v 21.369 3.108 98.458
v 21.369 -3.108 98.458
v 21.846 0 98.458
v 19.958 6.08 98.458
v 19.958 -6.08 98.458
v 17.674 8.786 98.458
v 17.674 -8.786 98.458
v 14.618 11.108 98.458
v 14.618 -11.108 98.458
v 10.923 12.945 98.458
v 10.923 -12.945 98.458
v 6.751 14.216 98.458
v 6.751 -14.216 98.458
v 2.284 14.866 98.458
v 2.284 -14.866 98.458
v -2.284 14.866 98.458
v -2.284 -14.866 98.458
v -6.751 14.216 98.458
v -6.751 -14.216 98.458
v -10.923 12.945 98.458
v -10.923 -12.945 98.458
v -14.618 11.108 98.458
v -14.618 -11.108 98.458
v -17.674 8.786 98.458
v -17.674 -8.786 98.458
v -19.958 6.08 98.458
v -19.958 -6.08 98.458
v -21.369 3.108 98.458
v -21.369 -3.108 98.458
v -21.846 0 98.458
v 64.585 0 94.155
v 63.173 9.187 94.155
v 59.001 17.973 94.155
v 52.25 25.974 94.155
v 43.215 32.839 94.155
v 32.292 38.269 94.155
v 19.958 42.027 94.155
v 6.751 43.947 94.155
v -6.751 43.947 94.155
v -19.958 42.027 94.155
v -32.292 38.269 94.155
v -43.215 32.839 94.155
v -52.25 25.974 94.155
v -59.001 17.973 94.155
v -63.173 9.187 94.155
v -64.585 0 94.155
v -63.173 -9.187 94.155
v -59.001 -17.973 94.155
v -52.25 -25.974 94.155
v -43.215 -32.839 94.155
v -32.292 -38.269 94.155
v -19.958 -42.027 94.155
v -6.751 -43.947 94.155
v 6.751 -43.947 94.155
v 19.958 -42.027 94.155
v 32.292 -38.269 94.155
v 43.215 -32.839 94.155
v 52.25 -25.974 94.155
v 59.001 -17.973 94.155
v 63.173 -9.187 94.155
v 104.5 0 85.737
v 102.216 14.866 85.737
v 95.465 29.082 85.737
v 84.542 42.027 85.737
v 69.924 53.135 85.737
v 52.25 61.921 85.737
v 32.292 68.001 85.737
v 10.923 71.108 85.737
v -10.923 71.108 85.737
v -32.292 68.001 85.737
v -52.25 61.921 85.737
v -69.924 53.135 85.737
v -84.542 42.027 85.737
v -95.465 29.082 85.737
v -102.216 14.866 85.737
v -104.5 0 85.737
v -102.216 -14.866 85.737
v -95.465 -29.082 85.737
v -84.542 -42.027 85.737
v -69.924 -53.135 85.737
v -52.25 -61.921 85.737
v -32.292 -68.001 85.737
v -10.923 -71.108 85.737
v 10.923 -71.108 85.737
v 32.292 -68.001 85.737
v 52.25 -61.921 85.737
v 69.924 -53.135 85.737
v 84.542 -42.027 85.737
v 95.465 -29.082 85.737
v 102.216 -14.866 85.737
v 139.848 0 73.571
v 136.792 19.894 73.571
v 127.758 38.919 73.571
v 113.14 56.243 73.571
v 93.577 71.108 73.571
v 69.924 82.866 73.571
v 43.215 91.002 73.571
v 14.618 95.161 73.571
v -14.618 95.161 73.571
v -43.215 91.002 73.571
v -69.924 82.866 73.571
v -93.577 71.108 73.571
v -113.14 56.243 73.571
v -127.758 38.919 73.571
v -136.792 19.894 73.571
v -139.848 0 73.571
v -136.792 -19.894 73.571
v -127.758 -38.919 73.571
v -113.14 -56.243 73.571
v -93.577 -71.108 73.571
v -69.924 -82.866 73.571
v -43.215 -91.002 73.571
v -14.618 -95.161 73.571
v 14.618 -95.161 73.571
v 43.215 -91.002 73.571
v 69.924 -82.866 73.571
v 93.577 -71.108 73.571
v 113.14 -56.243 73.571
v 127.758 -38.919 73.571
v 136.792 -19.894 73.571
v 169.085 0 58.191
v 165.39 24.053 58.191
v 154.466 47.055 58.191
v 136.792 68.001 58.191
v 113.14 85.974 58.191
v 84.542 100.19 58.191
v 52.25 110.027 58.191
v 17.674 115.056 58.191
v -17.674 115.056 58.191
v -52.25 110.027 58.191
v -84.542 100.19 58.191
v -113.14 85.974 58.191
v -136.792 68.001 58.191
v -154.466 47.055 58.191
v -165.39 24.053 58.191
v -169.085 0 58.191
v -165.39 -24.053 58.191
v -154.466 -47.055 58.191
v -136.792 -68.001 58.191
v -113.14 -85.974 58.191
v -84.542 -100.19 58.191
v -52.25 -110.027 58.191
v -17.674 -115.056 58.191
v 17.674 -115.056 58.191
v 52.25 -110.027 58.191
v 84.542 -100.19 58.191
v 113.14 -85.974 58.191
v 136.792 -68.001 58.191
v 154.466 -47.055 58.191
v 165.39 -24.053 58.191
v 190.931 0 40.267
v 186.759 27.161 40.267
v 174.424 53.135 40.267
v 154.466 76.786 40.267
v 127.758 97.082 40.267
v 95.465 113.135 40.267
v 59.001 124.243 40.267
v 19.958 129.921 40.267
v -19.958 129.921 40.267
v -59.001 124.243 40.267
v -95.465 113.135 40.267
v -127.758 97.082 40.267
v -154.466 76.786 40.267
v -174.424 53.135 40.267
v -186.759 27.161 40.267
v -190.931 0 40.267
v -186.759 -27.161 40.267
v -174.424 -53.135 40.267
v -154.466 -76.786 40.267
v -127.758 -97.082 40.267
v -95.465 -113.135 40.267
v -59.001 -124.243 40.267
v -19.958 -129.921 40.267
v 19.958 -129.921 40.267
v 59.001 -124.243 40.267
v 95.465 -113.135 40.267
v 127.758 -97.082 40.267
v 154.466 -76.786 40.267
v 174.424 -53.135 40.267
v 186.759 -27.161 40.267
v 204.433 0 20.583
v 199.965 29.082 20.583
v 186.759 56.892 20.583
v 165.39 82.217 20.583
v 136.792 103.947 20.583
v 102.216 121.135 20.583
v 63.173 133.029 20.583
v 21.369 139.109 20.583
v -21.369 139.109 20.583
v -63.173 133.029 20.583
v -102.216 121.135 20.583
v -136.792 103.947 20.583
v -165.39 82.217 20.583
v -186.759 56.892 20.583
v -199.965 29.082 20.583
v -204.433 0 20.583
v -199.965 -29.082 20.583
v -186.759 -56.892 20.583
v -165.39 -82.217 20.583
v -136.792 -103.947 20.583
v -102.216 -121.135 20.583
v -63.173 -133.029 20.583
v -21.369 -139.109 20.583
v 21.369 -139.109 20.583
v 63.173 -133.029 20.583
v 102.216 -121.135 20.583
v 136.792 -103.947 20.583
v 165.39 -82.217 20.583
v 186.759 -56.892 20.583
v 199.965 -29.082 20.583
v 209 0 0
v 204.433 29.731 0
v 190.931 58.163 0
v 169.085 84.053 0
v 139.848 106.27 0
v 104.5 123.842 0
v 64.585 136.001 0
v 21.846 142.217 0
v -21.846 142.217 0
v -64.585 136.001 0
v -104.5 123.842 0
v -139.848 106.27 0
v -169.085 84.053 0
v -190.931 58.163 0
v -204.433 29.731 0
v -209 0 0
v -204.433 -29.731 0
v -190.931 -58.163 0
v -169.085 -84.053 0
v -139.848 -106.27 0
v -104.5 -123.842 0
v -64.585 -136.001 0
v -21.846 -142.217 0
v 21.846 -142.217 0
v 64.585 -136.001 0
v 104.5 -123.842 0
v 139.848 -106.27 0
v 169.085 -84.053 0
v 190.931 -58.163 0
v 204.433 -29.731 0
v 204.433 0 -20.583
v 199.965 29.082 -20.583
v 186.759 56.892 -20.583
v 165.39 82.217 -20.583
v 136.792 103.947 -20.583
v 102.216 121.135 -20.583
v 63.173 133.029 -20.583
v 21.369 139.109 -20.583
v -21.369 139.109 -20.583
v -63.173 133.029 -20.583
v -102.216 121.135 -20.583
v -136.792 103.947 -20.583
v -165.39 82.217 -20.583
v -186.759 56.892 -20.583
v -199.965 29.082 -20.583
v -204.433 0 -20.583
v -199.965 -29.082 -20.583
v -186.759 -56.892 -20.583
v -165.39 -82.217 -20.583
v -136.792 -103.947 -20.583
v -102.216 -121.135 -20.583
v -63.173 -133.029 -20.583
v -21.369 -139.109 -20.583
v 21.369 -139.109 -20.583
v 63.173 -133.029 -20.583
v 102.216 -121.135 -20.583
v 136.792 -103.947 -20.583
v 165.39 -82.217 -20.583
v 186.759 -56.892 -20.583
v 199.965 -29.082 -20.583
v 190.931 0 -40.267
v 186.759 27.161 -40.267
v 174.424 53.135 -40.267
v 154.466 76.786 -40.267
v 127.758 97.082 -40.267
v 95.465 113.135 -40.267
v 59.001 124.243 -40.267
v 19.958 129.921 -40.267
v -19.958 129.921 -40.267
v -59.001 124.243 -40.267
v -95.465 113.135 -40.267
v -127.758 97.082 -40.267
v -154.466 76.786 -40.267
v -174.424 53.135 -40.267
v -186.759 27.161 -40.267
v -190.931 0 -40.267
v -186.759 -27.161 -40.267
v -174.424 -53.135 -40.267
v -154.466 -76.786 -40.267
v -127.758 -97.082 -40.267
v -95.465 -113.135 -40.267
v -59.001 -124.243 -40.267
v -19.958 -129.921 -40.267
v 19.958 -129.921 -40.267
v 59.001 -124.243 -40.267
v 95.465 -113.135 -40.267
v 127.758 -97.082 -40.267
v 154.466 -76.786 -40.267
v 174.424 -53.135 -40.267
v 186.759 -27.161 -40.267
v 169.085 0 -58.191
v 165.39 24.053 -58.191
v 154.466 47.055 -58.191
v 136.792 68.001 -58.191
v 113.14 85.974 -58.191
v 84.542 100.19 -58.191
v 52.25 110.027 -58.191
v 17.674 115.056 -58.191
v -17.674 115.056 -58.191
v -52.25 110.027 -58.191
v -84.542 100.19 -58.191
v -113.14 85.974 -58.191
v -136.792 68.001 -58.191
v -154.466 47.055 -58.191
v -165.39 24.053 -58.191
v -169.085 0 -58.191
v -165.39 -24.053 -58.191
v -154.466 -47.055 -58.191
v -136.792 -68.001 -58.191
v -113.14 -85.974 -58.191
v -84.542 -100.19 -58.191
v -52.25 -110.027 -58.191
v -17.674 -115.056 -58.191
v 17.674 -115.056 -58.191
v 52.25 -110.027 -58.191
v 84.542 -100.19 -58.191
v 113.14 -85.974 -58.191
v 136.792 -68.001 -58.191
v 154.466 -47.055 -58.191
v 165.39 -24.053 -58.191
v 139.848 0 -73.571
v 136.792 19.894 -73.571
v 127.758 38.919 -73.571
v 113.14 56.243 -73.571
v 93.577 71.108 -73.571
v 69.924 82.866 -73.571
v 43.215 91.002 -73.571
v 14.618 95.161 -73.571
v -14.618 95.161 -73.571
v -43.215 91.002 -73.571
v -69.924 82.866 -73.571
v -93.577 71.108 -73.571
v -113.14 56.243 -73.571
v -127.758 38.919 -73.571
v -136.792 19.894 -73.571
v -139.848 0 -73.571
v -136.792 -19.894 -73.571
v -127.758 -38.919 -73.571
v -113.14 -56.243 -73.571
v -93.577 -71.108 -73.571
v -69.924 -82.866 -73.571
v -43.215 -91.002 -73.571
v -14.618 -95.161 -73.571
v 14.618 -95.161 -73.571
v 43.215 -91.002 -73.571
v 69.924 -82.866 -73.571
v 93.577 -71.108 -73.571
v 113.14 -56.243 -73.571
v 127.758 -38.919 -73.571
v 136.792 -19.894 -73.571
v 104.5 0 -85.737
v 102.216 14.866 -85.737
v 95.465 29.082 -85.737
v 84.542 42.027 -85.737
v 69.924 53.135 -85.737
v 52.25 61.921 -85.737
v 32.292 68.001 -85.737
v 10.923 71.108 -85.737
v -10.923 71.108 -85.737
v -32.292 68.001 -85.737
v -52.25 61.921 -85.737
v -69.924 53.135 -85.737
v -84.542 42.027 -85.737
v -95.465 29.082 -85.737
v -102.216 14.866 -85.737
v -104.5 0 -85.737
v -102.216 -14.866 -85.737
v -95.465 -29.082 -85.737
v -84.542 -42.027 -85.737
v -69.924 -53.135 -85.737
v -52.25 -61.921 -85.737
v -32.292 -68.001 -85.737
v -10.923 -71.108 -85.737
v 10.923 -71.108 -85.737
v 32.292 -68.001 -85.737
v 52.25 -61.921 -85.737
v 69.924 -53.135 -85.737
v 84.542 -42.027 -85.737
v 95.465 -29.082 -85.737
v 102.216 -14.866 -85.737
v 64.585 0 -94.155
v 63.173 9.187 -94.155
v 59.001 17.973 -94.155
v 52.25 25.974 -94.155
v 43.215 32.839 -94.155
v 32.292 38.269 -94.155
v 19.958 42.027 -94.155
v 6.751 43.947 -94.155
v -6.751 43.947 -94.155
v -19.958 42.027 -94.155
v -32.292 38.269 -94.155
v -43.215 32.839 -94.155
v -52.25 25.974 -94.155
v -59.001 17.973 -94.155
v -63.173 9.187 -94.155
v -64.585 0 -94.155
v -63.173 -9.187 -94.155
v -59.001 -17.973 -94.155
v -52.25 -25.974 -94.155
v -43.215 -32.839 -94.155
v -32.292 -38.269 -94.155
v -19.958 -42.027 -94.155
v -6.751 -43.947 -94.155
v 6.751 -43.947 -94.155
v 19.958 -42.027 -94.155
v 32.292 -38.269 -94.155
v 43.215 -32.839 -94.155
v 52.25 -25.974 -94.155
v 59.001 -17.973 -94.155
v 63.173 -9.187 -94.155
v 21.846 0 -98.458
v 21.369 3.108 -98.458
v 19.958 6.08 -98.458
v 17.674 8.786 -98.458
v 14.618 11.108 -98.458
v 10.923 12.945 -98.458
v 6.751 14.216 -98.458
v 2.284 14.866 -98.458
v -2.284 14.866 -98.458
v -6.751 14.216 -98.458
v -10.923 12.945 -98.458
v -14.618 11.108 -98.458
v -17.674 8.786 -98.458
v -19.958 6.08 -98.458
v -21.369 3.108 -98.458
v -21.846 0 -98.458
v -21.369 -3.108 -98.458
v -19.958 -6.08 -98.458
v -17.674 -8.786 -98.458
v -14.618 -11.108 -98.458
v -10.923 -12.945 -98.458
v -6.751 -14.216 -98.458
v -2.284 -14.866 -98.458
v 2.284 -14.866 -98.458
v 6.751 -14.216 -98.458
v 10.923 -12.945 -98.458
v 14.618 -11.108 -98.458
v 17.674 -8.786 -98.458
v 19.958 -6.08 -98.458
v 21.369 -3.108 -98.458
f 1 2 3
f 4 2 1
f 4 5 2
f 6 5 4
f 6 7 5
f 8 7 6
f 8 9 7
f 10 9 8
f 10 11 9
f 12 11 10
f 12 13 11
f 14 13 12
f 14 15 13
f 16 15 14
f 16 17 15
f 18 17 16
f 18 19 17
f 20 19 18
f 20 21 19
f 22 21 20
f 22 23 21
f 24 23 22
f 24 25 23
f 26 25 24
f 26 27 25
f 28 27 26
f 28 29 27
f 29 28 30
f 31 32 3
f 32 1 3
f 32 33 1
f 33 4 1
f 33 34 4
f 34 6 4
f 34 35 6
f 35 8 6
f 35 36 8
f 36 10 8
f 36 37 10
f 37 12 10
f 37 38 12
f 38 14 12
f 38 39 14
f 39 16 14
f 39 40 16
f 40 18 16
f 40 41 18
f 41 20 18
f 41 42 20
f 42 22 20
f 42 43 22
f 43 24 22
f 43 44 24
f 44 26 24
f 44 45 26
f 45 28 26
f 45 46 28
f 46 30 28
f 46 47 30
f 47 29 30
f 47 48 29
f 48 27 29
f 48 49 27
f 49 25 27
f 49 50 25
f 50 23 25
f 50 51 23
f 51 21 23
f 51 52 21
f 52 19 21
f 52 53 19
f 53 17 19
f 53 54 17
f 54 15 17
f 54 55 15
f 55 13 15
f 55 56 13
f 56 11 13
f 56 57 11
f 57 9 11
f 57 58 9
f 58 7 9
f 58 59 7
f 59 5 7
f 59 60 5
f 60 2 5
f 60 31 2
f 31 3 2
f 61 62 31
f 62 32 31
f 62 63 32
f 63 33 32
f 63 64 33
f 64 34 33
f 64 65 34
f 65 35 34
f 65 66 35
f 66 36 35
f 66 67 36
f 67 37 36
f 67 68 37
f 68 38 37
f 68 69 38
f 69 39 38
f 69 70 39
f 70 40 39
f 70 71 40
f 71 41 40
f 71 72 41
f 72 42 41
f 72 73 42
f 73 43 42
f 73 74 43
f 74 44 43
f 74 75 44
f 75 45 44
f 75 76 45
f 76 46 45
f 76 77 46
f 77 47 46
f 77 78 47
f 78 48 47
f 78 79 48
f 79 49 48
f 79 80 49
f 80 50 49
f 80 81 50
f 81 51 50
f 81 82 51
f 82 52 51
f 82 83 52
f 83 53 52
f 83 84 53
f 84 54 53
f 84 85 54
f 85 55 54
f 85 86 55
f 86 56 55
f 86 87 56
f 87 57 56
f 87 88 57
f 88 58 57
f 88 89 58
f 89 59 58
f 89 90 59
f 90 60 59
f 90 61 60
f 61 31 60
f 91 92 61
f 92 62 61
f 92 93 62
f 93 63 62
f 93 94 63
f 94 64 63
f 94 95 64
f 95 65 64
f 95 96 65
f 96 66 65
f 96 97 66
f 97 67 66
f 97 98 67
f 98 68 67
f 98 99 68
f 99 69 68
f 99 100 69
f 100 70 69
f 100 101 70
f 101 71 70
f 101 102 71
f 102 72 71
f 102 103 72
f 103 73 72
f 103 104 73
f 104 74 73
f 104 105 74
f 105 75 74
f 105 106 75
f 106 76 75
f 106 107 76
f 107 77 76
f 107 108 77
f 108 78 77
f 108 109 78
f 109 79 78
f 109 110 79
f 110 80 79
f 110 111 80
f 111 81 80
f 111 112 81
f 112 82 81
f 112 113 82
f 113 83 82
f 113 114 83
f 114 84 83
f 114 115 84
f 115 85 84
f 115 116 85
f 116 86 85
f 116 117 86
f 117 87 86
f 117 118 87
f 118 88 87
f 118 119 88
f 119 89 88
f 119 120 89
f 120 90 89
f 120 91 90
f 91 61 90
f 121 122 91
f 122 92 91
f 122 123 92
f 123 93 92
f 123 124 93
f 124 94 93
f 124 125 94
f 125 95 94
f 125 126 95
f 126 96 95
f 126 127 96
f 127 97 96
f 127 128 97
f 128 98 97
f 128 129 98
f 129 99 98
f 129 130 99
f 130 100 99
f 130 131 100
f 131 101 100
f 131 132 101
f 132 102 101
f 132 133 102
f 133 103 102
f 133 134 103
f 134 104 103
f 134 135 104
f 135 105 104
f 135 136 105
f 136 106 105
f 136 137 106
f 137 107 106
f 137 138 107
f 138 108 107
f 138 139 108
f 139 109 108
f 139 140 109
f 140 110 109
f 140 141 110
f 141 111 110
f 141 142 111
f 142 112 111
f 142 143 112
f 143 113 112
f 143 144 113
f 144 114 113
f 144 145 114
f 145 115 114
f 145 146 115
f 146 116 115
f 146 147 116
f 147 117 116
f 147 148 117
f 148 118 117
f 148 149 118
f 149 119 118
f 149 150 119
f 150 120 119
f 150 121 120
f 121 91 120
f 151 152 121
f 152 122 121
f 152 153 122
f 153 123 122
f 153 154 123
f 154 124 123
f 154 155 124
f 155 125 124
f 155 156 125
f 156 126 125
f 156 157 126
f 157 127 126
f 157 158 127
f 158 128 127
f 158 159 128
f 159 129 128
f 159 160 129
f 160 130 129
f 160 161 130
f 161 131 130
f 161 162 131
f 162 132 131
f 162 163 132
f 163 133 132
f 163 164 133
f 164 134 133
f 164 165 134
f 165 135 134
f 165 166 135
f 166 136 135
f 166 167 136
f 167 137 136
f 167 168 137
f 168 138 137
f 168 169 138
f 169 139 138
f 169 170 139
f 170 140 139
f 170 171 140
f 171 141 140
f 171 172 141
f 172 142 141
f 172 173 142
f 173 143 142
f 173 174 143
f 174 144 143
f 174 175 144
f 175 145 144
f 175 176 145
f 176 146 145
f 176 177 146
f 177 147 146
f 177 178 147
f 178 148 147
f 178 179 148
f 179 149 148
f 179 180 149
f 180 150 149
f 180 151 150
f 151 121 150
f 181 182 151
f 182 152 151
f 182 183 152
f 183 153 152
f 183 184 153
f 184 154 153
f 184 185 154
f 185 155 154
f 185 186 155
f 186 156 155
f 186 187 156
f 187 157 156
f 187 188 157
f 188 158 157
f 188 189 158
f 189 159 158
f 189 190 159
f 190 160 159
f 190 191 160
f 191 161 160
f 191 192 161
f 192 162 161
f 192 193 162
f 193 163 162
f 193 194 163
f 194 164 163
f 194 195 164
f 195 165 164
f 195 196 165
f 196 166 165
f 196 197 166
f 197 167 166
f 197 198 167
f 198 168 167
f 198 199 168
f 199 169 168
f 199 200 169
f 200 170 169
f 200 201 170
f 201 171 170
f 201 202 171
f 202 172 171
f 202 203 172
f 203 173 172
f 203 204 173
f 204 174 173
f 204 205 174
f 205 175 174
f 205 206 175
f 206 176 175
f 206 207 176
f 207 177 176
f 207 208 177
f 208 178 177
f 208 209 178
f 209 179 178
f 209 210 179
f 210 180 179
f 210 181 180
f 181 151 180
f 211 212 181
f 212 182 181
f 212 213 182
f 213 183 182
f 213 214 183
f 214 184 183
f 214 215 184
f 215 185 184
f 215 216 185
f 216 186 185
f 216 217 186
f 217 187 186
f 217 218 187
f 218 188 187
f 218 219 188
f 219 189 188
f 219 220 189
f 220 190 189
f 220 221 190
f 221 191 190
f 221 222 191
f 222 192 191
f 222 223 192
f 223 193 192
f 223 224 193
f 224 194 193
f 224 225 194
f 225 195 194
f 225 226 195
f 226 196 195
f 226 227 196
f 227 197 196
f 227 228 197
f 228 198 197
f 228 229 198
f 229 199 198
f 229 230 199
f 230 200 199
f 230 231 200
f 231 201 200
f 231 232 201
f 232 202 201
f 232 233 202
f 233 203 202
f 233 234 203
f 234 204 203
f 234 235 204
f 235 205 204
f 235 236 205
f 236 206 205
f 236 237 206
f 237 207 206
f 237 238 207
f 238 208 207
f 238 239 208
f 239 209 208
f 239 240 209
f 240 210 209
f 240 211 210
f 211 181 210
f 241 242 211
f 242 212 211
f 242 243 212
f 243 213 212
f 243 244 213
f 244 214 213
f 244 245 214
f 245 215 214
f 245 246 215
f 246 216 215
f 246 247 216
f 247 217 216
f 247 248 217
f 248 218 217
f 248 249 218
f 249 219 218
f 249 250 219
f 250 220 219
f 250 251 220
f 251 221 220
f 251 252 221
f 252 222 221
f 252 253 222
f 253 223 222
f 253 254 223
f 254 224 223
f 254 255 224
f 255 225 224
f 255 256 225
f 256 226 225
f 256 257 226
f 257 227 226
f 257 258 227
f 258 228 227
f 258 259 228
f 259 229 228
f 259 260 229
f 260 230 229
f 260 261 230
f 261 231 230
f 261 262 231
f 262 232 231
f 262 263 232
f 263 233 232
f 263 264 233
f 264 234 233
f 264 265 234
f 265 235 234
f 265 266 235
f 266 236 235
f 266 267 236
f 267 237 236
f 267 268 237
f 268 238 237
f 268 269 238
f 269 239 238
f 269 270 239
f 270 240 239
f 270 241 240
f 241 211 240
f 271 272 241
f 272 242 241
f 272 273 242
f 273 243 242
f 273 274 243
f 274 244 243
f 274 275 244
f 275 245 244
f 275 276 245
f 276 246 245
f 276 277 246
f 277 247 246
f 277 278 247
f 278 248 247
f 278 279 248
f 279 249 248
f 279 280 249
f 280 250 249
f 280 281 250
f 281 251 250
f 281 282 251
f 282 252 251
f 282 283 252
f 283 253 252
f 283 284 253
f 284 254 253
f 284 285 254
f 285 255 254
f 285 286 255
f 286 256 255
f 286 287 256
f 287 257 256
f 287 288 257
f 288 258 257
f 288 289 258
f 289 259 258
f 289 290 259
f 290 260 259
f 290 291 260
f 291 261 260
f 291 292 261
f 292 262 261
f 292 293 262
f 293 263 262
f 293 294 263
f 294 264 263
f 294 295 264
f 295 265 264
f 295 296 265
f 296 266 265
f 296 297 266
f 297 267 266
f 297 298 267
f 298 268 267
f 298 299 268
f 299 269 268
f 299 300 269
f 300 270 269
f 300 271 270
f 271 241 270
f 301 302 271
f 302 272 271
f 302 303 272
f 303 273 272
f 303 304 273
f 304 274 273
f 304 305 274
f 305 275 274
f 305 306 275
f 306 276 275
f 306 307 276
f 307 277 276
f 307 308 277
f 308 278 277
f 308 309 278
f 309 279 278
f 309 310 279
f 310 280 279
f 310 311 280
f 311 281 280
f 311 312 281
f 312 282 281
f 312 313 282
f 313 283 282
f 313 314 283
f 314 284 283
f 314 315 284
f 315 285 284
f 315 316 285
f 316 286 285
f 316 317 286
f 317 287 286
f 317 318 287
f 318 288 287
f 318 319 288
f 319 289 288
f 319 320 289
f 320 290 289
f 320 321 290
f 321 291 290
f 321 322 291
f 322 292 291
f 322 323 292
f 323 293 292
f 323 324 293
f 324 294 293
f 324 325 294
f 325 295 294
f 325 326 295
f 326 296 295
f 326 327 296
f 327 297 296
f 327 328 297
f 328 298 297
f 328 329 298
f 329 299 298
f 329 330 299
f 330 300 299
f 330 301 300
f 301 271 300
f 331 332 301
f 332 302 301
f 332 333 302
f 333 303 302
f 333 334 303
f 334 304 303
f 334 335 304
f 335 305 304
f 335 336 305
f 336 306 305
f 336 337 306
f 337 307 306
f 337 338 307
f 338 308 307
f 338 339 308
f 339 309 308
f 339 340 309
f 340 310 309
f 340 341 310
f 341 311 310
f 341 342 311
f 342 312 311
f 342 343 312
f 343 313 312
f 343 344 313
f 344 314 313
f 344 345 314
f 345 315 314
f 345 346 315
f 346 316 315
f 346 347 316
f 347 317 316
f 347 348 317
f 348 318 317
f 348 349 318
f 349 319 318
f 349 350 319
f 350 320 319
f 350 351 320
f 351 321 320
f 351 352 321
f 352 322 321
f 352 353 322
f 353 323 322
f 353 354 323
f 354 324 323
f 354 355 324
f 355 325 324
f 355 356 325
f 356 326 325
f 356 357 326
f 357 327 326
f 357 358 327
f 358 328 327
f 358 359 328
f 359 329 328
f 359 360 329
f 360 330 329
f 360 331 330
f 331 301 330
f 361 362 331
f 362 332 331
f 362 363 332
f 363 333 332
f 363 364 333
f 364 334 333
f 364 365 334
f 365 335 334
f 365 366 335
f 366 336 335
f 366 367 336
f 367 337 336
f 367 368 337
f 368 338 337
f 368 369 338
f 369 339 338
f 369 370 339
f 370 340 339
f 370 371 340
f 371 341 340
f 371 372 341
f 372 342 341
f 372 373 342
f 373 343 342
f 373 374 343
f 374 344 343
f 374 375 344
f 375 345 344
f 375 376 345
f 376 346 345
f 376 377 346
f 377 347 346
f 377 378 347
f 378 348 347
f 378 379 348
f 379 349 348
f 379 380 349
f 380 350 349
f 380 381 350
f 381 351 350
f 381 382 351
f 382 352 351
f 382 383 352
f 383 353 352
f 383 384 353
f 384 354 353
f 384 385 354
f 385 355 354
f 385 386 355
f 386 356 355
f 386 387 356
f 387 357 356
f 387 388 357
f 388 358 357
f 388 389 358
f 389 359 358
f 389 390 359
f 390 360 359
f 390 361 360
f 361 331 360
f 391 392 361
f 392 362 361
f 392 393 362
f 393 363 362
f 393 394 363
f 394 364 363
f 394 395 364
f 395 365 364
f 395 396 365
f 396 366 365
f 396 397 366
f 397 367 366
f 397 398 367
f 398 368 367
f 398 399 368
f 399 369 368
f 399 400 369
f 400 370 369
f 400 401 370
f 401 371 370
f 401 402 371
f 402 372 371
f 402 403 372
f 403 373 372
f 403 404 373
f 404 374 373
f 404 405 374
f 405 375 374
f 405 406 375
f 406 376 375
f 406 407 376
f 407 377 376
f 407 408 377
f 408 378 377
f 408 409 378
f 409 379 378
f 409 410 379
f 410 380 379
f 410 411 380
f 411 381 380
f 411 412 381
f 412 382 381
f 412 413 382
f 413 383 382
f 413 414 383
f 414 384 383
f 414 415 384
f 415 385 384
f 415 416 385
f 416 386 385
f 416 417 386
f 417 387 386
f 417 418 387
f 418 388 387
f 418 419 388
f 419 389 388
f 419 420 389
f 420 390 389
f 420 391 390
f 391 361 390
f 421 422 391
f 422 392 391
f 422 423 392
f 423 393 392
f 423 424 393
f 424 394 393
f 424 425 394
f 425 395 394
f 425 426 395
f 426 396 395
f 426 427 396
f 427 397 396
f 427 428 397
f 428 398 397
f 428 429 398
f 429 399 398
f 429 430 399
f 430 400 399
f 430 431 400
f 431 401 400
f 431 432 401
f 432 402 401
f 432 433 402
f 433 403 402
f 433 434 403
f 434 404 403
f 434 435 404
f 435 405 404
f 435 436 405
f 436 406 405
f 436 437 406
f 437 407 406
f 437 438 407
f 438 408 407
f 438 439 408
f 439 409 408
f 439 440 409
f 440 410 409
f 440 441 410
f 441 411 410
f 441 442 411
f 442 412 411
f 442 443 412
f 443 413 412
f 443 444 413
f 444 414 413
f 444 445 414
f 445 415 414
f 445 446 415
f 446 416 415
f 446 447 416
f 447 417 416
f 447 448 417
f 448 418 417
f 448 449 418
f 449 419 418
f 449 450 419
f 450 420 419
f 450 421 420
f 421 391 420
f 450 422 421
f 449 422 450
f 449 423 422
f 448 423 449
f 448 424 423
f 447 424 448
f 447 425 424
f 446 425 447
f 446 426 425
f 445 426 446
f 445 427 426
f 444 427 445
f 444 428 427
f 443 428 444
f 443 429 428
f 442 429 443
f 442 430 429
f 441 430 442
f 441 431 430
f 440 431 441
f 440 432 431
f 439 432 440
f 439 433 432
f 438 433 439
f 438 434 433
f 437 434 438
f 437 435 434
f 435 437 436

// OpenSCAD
// Generated by SolidPython 1.0.1 on 2020-07-29 00:46:54


scale(v = [19, 13, 9]) {
	sphere(r = 11);
}
/***********************************************
*********      SolidPython code:      **********
************************************************
 
# import packages: SolidPython
from solid import *
from solid.utils import *
from itertools import chain, combinations, permutations


class Resize:

    def __init__(self, scad_file):
        self.scad_file = scad_file
        #self.scad_file = import_scad(scad_file)
        # cone/cylinder param:
        self.r1 = 0
        self.r2 = 0
        self.h = 0
        # rectangular prism param:
        self.w = 0
        self.l = 0
        # ellipse param:
        self.r = 0

    # import OpenScad code (file name corresponds to shape)


    # classify shape + parameters
    def assign(self, param1, param2, param3):
        if self.scad_file == 'cone.scad':
            self.r1 = param1
            self.r2 = param2
            self.h = param3
        elif self.scad_file == 'cylinder.scad':
            self.r1 = param1
            self.r2 = param2
            self.h = param3
        elif self.scad_file == 'rectangularPrism.scad':
            self.h = param1
            self.l = param2
            self.w = param3
        else:
            self.r = param1
            self.h = param2

    # resize parameters
    def iterate(self):
        x = range(3, 20, 2)
        i = 1
        if self.scad_file == 'cone.scad':
            tempList = list(permutations(x, 2))
            for temp in tempList:
                param1 = temp[0]
                param2 = temp[1]
                filepath = 'produced_scad_files/' + 'cone' + str(param1) + '_' + str(param2) + '_' + '.scad'
                scad_render_to_file(cylinder(h=param1, r1=param2, r2=0), filepath)

        elif self.scad_file == 'cylinder.scad':
            tempList = list(permutations(x, 3))
            for temp in tempList:
                param1 = temp[0]
                param2 = temp[1]
                filepath = 'produced_scad_files/' + 'cylinder' + str(param1) + '_' + str(param2) + '_' + '.scad'
                scad_render_to_file(cylinder(h=param1, r1=param2, r2=param2), filepath)

        elif self.scad_file == 'rectangularPrism.scad':
            tempList = list(permutations(x, 3))
            for temp in tempList:
                param1 = temp[0]
                param2 = temp[1]
                param3 = temp[2]
                filepath = 'produced_scad_files/' + 'rectangularPrism' + str(param1) + '_' + str(param2) + '_' + str(
                    param3) + '.scad'
                scad_render_to_file(cube(size=(param1, param2, param3)), filepath)

        elif self.scad_file == 'ellipse.scad':
            tempList = list(permutations(x, 4))
            for temp in tempList:
                param1 = temp[0]
                param2 = temp[1]
                param3 = temp[2]
                param4 = temp[3]
                filepath = 'produced_scad_files/' + 'ellipse' + str(param1) + '_' + str(param2) + '_' + str(param3) + '_' + str(param4) + '.scad'
                scad_render_to_file(scale([param1, param2, param3])(sphere(r=param4)), filepath)

    def render_to_scadfile(self):
        scad_render_to_file(scad, 'example.scad') 
 
************************************************/
